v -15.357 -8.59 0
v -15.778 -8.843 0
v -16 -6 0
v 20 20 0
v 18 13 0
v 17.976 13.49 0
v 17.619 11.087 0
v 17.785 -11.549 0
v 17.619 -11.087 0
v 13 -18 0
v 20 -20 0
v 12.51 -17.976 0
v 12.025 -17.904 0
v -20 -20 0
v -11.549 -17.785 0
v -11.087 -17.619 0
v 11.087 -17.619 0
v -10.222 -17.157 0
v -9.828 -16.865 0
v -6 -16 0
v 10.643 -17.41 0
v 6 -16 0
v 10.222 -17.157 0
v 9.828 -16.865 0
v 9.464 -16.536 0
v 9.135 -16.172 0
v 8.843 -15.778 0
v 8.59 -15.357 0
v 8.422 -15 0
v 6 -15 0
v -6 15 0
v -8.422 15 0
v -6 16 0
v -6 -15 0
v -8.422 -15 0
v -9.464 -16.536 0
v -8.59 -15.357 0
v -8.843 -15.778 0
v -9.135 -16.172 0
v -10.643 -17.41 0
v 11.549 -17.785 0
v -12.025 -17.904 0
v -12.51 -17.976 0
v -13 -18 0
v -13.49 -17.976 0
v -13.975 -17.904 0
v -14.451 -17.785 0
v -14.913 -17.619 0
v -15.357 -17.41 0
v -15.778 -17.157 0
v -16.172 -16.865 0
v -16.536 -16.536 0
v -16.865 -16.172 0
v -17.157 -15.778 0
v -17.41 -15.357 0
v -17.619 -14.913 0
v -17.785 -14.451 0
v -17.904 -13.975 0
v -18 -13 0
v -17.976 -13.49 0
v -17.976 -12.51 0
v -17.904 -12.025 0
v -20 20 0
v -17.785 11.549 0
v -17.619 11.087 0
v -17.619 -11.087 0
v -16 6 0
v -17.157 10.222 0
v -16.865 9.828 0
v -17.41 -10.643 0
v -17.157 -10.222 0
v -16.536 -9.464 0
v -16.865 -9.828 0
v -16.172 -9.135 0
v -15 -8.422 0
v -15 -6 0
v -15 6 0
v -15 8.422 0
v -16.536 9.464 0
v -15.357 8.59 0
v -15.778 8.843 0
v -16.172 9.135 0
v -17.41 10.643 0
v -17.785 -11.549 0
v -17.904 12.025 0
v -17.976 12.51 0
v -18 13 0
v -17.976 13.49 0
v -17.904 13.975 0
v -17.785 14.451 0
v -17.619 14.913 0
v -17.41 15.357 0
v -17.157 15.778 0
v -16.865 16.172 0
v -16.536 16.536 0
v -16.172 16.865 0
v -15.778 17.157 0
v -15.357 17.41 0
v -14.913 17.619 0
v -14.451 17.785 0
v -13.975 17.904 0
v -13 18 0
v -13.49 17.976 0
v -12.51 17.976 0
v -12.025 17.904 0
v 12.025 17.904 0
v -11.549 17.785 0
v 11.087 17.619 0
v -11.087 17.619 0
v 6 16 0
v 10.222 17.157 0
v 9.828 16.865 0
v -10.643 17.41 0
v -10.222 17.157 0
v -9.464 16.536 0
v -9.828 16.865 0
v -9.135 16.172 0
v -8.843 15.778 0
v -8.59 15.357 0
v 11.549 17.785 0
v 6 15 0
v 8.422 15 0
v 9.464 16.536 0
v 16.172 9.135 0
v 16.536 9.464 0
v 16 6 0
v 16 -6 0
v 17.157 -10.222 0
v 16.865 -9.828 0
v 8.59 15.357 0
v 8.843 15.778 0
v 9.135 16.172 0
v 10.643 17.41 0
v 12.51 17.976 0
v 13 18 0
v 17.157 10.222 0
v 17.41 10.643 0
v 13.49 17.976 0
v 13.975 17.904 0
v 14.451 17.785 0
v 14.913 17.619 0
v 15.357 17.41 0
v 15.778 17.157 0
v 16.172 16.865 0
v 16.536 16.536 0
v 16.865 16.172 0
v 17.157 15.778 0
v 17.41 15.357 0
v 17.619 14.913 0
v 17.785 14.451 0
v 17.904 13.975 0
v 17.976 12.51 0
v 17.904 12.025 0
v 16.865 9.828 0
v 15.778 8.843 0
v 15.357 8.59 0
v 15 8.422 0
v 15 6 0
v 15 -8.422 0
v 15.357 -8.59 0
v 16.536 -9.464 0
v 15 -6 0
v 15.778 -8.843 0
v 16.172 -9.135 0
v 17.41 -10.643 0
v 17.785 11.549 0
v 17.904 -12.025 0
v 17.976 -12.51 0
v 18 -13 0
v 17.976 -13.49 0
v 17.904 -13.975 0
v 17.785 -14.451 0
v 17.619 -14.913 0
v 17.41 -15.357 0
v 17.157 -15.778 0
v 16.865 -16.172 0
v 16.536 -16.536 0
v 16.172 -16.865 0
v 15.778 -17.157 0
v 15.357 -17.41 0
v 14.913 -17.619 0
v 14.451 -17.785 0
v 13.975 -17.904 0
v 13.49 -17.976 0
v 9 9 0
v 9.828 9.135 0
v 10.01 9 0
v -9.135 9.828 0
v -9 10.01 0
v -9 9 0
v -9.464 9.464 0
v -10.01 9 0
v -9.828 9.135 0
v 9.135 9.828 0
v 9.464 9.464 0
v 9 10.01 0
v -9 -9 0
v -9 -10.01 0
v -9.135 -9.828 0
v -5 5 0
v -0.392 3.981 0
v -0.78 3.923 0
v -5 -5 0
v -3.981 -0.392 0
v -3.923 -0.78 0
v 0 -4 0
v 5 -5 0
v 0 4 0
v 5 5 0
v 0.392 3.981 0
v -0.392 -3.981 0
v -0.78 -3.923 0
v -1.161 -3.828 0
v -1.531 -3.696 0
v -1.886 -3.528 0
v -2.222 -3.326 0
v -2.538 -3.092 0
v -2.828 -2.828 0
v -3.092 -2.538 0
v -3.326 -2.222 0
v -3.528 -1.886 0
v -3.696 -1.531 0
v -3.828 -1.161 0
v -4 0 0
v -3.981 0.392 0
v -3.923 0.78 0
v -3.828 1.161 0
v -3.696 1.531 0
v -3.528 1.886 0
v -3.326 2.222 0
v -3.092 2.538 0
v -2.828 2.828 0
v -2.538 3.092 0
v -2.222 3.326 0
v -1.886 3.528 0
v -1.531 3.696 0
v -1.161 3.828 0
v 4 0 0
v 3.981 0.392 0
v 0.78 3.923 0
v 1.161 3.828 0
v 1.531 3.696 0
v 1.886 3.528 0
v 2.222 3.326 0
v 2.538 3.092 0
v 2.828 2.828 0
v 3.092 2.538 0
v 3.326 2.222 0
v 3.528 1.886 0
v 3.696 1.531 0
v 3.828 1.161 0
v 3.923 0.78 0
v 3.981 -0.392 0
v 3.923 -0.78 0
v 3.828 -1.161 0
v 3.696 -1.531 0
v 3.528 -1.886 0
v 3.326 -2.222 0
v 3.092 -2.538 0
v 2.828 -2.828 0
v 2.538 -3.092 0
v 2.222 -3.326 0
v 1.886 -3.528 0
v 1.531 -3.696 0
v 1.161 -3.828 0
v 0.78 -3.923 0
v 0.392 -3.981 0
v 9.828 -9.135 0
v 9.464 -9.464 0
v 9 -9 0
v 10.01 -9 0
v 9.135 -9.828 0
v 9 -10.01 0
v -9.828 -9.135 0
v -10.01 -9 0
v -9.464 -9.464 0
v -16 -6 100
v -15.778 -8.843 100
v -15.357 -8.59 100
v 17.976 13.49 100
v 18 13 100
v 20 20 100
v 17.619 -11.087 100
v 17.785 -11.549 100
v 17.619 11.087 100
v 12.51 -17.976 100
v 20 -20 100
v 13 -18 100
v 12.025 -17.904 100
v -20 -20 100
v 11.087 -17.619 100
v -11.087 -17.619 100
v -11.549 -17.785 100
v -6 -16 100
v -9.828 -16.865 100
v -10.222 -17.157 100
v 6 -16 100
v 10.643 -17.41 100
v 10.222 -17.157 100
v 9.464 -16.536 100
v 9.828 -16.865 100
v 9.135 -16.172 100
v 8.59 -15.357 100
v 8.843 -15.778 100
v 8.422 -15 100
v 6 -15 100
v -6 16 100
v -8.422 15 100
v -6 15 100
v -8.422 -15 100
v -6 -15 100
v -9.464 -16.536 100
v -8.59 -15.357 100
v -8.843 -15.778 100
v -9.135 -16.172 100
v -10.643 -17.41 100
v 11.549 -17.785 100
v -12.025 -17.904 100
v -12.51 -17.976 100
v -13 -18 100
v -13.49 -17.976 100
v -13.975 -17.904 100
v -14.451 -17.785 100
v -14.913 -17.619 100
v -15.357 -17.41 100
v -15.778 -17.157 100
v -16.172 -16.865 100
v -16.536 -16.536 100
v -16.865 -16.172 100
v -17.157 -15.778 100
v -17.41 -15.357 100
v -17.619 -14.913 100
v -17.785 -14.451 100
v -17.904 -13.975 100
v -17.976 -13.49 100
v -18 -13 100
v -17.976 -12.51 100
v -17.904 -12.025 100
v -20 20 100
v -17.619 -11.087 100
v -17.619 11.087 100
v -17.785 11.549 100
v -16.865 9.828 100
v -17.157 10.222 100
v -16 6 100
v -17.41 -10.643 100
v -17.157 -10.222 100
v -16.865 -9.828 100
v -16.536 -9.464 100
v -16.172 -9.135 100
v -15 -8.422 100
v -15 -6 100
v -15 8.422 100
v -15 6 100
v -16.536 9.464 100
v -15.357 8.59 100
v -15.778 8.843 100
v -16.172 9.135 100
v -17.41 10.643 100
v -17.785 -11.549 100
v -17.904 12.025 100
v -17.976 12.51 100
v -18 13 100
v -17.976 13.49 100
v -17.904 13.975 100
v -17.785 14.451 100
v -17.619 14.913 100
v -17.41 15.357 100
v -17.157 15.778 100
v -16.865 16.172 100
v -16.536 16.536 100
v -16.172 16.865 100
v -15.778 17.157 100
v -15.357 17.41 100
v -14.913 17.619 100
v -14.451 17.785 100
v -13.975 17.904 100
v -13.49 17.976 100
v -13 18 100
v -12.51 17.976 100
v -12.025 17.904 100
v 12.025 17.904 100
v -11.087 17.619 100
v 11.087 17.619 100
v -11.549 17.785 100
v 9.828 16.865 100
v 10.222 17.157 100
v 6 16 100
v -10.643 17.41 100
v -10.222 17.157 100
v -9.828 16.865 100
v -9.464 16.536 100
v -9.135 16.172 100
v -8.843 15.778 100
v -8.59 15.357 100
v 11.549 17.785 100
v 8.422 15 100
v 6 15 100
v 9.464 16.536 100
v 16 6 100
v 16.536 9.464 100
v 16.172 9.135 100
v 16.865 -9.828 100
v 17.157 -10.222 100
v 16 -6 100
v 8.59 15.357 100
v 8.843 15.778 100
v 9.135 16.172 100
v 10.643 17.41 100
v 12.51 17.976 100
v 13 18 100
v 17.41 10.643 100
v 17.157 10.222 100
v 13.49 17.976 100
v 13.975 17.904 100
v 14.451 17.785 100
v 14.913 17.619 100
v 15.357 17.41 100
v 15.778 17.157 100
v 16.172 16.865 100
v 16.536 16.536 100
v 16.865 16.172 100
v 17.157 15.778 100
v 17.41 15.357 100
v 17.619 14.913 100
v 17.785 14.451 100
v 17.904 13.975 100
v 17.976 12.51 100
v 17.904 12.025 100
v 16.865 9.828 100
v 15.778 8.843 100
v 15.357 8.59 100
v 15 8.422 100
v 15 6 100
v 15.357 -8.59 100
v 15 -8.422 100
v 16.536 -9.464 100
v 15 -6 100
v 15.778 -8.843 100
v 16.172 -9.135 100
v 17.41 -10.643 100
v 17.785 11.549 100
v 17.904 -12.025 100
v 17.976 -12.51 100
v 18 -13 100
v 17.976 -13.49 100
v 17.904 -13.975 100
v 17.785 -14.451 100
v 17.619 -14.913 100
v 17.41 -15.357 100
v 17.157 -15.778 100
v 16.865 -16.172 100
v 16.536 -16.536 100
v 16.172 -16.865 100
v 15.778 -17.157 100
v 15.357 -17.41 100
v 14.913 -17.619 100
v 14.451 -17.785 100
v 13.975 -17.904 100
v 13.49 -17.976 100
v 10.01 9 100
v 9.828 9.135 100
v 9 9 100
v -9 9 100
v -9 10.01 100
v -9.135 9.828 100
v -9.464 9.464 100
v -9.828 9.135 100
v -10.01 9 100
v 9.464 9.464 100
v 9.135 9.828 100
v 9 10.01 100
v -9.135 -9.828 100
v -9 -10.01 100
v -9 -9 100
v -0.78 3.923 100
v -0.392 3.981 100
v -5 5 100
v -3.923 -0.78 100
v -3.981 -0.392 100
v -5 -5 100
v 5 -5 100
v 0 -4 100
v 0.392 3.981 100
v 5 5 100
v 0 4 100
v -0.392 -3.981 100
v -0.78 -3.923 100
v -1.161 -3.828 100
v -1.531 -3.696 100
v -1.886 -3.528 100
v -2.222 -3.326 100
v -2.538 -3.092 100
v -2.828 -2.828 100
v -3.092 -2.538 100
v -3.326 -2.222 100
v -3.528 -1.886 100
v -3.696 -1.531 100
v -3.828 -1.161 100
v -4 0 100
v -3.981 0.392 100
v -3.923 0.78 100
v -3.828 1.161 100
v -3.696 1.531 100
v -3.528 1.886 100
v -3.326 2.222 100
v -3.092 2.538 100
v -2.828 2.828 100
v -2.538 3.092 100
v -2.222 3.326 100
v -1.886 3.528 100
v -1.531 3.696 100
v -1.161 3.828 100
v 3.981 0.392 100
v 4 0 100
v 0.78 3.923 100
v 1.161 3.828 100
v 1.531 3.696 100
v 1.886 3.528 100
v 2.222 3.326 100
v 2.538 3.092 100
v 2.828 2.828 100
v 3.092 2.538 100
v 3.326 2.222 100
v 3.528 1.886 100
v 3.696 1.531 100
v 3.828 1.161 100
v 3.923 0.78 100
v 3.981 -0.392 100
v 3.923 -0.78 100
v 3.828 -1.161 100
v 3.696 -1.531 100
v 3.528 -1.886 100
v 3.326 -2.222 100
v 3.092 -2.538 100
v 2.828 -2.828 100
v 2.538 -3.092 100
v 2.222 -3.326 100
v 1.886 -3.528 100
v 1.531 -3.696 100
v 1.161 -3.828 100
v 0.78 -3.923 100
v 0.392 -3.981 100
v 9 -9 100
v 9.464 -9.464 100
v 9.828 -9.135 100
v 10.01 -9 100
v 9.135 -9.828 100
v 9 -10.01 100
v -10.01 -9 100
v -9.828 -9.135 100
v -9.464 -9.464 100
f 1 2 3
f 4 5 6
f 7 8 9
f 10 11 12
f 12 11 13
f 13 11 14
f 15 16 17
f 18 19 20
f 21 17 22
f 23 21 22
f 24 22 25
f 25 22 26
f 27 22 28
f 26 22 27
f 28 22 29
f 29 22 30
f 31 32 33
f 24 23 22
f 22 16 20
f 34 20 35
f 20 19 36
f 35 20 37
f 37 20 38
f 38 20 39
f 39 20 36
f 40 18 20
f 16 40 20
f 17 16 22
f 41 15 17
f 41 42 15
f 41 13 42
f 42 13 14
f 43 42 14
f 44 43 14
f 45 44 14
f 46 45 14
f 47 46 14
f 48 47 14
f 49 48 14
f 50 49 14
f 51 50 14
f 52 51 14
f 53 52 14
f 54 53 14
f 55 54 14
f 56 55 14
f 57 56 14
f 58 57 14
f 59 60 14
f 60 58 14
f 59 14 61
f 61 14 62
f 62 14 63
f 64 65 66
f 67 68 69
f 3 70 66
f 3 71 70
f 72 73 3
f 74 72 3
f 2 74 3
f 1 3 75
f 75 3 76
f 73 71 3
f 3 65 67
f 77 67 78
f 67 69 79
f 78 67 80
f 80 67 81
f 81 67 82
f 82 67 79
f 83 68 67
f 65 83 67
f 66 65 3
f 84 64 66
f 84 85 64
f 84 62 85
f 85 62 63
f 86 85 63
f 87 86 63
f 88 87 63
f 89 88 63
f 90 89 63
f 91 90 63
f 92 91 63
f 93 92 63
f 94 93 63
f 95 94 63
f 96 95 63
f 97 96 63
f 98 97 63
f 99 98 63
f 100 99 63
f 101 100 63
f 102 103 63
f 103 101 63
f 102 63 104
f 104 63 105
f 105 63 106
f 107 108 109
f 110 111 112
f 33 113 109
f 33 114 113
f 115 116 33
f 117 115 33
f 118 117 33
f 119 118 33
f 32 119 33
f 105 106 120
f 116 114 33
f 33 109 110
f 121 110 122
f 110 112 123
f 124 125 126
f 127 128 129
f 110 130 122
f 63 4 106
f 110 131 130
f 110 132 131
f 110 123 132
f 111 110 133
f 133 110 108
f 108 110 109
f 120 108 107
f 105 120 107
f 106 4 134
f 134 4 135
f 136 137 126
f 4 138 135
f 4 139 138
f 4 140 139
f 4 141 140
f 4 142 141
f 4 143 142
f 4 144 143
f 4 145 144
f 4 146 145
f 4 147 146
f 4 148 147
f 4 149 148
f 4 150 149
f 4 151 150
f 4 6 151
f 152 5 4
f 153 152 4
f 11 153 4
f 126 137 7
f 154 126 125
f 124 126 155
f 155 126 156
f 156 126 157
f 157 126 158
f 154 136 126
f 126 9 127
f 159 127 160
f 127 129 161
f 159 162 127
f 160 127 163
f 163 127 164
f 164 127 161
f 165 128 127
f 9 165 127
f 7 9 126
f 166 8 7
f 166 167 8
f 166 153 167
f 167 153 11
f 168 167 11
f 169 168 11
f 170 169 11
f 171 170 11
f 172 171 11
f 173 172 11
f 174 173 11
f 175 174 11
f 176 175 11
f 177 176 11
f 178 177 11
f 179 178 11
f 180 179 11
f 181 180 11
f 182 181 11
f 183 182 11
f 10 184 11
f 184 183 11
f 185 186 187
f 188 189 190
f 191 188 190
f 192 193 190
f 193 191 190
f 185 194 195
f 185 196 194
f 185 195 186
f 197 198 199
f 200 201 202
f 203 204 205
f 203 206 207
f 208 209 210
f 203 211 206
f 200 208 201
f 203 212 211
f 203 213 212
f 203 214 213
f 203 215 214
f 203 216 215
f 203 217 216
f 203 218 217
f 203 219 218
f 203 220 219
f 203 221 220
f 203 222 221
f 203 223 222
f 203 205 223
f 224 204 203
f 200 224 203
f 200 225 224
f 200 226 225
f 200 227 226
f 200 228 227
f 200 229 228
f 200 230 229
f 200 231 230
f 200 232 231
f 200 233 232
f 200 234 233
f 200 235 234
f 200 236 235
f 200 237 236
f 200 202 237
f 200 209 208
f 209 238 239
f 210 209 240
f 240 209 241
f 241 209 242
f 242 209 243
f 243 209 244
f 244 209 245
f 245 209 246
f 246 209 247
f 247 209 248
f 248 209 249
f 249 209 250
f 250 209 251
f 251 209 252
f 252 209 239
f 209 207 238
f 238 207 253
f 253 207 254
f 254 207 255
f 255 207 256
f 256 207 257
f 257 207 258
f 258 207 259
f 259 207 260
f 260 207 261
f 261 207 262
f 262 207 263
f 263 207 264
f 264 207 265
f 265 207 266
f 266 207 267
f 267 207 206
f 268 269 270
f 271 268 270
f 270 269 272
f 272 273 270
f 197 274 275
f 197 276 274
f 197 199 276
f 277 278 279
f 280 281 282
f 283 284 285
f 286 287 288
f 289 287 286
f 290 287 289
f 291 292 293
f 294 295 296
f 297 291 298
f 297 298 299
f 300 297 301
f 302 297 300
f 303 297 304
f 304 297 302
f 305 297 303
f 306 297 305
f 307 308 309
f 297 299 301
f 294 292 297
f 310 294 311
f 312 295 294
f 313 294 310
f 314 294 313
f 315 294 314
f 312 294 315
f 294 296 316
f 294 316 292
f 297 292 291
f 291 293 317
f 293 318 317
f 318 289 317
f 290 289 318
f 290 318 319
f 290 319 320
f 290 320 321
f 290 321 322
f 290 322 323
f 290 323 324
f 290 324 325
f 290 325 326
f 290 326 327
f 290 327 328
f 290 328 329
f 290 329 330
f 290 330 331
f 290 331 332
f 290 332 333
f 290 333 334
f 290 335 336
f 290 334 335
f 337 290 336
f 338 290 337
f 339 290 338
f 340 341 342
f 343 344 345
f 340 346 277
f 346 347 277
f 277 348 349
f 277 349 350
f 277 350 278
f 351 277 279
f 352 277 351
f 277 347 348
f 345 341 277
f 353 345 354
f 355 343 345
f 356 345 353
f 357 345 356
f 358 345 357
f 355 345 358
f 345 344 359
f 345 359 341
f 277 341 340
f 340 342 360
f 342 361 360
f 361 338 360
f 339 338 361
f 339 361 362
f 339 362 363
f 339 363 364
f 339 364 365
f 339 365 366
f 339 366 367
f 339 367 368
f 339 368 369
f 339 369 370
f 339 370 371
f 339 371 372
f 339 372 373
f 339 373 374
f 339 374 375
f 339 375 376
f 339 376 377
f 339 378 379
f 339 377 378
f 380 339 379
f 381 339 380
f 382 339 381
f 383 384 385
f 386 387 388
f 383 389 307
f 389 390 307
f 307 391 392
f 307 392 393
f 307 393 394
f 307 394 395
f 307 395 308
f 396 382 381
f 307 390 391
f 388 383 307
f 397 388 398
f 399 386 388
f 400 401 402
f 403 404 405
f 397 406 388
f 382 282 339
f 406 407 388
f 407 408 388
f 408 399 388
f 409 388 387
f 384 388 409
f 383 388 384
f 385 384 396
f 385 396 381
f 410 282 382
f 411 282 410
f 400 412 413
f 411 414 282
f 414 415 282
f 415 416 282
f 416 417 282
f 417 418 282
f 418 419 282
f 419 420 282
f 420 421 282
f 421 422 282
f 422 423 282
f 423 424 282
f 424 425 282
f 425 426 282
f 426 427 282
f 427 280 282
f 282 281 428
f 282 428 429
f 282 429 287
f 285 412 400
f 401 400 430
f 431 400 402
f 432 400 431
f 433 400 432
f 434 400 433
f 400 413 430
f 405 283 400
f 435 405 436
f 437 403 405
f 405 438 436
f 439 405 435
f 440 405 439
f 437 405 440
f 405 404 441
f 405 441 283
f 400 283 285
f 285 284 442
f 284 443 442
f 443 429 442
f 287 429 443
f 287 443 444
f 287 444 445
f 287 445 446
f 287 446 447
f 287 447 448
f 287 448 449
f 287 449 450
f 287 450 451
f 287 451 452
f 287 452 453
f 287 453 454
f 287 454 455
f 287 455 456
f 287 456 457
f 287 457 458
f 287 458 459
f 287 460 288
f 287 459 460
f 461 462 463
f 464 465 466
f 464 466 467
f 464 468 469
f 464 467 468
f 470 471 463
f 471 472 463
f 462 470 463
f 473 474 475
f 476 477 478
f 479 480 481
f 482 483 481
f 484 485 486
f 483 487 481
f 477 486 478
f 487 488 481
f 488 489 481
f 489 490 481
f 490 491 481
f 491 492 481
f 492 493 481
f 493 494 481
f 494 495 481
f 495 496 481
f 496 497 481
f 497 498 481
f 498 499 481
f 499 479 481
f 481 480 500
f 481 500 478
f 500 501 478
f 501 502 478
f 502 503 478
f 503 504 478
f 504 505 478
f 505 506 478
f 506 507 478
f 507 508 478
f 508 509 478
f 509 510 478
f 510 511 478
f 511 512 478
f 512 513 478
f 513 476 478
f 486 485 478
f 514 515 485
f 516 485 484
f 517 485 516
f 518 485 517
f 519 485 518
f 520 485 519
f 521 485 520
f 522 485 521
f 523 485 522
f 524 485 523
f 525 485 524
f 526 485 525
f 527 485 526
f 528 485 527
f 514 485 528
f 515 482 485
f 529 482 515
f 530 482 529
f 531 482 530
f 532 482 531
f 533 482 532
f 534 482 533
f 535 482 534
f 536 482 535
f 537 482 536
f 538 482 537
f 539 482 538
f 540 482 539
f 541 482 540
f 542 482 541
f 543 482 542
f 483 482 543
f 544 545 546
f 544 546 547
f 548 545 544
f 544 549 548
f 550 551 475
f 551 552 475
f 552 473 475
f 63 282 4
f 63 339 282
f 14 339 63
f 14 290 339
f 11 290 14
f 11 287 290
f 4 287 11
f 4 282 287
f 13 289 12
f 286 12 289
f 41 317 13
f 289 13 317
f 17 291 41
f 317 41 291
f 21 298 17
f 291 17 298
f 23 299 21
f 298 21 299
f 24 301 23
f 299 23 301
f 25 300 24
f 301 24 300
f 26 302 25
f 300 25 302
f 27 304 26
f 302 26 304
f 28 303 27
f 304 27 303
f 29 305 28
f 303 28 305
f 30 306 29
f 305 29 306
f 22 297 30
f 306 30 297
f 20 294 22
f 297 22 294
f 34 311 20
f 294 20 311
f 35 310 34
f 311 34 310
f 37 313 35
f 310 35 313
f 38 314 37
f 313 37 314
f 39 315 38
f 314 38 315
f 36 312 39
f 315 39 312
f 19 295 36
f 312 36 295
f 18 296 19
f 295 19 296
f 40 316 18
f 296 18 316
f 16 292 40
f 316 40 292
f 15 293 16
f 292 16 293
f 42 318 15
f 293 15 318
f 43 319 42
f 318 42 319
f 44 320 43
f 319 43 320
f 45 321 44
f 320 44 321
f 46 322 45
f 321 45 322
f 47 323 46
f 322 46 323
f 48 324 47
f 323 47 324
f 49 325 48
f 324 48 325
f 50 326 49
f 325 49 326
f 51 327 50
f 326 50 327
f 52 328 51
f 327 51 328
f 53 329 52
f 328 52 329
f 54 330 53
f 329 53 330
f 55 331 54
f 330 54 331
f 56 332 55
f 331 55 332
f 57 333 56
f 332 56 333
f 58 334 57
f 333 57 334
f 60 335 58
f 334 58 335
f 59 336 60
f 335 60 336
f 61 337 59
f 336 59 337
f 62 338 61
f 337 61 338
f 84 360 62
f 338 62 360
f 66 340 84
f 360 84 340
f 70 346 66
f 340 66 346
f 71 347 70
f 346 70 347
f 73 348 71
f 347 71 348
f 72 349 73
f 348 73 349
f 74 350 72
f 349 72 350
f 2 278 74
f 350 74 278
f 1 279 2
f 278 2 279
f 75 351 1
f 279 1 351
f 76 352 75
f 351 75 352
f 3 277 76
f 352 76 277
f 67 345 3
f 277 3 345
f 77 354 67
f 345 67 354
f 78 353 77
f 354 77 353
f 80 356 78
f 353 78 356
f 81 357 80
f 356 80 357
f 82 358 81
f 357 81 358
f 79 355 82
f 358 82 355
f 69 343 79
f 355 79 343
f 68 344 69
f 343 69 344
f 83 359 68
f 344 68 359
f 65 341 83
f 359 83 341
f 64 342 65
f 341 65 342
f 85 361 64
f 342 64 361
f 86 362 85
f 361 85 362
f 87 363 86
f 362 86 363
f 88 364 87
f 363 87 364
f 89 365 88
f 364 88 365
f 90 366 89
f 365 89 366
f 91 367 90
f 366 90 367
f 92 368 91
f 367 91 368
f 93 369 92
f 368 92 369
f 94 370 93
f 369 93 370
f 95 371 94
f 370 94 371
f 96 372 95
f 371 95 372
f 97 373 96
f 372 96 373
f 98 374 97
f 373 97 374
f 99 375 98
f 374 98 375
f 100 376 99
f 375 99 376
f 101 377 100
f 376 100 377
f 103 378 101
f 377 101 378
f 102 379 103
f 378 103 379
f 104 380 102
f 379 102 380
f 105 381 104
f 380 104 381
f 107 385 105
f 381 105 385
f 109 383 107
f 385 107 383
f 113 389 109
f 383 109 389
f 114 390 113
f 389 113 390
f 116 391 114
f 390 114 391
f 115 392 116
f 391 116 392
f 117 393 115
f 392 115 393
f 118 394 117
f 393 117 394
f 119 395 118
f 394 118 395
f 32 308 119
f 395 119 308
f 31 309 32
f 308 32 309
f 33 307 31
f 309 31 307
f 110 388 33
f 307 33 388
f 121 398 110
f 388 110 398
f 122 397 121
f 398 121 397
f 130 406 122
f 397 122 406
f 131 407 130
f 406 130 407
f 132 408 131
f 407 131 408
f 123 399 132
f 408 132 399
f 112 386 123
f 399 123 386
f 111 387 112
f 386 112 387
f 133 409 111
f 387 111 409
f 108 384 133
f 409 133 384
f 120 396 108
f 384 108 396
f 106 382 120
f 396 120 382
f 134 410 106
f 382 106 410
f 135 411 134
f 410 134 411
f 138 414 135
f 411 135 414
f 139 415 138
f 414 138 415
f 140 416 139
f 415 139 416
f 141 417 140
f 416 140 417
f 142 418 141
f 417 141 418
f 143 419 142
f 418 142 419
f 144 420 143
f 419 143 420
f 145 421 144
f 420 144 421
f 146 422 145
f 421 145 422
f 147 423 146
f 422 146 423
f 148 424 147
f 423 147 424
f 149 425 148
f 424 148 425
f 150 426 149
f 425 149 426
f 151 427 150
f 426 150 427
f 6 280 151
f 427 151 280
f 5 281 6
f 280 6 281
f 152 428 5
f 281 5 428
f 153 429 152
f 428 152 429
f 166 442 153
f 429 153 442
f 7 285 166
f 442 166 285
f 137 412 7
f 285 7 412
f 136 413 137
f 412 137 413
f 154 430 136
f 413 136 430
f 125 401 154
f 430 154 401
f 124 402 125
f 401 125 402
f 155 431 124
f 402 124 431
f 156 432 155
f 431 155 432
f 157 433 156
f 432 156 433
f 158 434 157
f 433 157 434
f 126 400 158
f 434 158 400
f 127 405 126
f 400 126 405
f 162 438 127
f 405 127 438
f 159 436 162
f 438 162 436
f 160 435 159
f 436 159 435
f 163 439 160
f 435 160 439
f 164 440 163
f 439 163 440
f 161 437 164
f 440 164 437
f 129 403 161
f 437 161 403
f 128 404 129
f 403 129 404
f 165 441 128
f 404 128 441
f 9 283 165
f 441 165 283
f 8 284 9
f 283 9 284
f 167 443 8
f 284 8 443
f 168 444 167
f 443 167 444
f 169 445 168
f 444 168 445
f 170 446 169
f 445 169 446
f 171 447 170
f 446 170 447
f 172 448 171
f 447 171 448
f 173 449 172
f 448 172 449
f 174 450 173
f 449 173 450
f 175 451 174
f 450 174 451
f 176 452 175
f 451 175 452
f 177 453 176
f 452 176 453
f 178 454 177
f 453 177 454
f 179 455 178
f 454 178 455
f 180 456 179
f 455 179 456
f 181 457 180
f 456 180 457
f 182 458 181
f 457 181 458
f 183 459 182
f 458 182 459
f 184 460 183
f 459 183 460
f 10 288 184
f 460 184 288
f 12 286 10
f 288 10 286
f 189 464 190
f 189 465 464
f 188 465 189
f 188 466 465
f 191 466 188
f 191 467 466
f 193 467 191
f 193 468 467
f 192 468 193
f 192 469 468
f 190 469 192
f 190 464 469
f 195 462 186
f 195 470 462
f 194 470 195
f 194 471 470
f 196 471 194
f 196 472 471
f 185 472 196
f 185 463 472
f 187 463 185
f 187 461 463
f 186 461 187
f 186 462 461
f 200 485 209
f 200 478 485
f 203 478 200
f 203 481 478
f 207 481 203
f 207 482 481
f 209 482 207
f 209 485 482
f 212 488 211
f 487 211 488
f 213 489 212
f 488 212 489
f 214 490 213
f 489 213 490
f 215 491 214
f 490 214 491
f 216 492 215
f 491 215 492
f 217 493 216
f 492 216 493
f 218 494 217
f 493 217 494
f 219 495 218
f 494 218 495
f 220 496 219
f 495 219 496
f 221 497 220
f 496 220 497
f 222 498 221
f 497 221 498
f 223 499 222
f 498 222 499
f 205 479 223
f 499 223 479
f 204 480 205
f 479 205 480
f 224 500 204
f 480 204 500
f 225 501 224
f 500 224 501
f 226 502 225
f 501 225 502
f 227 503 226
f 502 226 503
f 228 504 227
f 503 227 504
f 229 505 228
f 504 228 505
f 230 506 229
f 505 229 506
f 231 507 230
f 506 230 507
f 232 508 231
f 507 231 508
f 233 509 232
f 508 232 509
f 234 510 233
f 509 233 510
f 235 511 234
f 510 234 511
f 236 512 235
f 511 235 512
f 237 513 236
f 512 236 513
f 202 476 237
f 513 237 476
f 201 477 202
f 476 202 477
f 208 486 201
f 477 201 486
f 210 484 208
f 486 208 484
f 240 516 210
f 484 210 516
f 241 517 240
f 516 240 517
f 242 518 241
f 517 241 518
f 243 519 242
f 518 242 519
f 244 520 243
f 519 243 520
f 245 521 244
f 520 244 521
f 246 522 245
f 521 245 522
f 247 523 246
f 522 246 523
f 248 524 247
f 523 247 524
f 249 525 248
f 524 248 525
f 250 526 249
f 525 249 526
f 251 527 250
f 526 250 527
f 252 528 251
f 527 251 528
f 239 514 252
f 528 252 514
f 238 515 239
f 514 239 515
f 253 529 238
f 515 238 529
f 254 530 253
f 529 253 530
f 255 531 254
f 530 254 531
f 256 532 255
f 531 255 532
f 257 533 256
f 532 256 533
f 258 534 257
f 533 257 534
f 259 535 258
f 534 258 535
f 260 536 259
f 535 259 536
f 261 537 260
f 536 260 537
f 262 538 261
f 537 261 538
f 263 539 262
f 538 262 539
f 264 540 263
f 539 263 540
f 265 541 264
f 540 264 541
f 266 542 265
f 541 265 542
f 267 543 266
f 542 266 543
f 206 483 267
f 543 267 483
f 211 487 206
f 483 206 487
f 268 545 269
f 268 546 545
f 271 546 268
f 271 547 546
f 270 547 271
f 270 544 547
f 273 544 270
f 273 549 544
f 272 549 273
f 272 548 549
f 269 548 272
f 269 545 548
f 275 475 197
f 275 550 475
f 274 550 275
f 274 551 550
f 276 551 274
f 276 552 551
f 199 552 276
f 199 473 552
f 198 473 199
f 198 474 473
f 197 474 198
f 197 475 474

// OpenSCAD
$fn = 64;

// Parameters
size = 40.0;      // cross-section width/height (mm)
length = 100.0;   // extrusion length (mm)

// Simple 40x40 aluminum extrusion-like profile (approximation)
module extrusion_40x40_profile() {
    difference() {
        // Outer square
        square([size, size], center = true);

        // Central bore
        circle(d = 8.0);

        // T-slots (approximate) on each face
        for (a = [0, 90, 180, 270]) {
            rotate(a) translate([size/2 - 6.0, 0]) {
                // Slot opening at the face
                square([4.0, 12.0], center = true);
                // Wider internal cavity
                translate([-4.0, 0]) square([10.0, 18.0], center = true);
            }
        }

        // Corner relief pockets (approximate)
        for (sx = [-1, 1], sy = [-1, 1]) {
            translate([sx*(size/2 - 7.0), sy*(size/2 - 7.0)])
                circle(d = 10.0);
        }
    }
}

linear_extrude(height = length, center = false, convexity = 10)
    extrusion_40x40_profile();
